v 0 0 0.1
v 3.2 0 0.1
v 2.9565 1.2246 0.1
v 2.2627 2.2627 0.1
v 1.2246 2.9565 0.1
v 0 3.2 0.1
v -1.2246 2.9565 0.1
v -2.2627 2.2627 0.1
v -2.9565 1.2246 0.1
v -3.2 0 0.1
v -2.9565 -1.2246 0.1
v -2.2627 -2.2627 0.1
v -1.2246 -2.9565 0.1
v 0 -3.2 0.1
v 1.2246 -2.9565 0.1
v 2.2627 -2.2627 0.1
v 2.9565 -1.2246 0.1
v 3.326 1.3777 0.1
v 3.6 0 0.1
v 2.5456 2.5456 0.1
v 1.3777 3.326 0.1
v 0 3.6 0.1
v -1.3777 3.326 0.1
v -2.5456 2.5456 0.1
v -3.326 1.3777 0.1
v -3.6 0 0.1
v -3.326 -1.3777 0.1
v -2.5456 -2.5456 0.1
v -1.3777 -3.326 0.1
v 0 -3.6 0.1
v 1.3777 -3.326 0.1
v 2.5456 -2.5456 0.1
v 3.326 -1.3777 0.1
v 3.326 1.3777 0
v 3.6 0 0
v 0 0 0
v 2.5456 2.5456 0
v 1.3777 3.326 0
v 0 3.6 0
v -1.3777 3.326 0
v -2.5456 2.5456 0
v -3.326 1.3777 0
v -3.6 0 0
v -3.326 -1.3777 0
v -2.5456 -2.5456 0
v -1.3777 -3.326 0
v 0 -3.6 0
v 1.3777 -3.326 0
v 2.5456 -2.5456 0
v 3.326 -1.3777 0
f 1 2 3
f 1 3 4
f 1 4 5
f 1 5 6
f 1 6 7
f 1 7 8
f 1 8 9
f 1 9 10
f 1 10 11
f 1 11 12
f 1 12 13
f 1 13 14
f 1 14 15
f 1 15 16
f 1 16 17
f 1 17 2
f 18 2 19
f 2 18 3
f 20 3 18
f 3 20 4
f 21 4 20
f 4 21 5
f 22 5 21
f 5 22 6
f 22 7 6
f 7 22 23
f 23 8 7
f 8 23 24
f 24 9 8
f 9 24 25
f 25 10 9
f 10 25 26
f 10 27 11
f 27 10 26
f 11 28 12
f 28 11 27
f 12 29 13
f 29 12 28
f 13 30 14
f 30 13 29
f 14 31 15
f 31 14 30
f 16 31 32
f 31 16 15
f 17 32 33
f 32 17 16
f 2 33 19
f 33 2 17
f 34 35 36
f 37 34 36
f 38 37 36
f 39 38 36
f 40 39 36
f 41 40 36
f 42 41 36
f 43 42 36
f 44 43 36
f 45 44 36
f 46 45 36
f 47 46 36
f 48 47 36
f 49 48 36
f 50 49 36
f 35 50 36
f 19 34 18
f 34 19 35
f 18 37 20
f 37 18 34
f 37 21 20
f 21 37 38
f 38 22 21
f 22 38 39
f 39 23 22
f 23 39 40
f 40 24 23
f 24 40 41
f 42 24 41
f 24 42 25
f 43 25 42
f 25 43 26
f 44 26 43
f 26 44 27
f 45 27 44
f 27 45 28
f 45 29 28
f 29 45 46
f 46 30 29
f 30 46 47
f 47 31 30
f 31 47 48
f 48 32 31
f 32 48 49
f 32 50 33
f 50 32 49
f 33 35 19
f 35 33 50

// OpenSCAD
// file: ../p/4-4cyli.scad
use <../lib.scad>
function ldraw_lib__4_4cyli() = [
// 0 Cylinder 1.0
// 0 Name: 4-4cyli.dat
// 0 Author: James Jessiman
// 0 !LDRAW_ORG Primitive UPDATE 2005-01
// 0 !LICENSE Licensed under CC BY 2.0 and CC BY 4.0 : see CAreadme.txt
// 
// 0 BFC CERTIFY CCW
  [0,"BFC","CERTIFY"],
  [0,"BFC","CCW"],
// 
// 0 !HISTORY 1998-12-15 [PTadmin] Official Update 1998-10
// 0 !HISTORY 2002-03-23 [sbliss] Added BFC statement; merged headers from files in distributions LDraw 0.27 and Complete.
// 0 !HISTORY 2002-04-25 [PTadmin] Official Update 2002-02
// 0 !HISTORY 2004-12-14 [guyvivan] BFC CCW
// 0 !HISTORY 2005-12-28 [PTadmin] Official Update 2005-01
// 0 !HISTORY 2007-06-24 [PTadmin] Header formatted for Contributor Agreement
// 0 !HISTORY 2008-07-01 [PTadmin] Official Update 2008-01
// 
// 
// 4 16 1 1 0 0.9239 1 0.3827 0.9239 0 0.3827 1 0 0
  [4,16,1,1,0,0.9239,1,0.3827,0.9239,0,0.3827,1,0,0],
// 5 24 1 0 0 1 1 0 0.9239 0 0.3827 0.9239 0 -0.3827
  [5,24,1,0,0,1,1,0,0.9239,0,0.3827,0.9239,0,-0.3827],
// 4 16 0.9239 1 0.3827 0.7071 1 0.7071 0.7071 0 0.7071 0.9239 0 0.3827
  [4,16,0.9239,1,0.3827,0.7071,1,0.7071,0.7071,0,0.7071,0.9239,0,0.3827],
// 5 24 0.9239 0 0.3827 0.9239 1 0.3827 0.7071 0 0.7071 1 0 0
  [5,24,0.9239,0,0.3827,0.9239,1,0.3827,0.7071,0,0.7071,1,0,0],
// 4 16 0.7071 1 0.7071 0.3827 1 0.9239 0.3827 0 0.9239 0.7071 0 0.7071
  [4,16,0.7071,1,0.7071,0.3827,1,0.9239,0.3827,0,0.9239,0.7071,0,0.7071],
// 5 24 0.7071 0 0.7071 0.7071 1 0.7071 0.3827 0 0.9239 0.9239 0 0.3827
  [5,24,0.7071,0,0.7071,0.7071,1,0.7071,0.3827,0,0.9239,0.9239,0,0.3827],
// 4 16 0.3827 1 0.9239 0 1 1 0 0 1 0.3827 0 0.9239
  [4,16,0.3827,1,0.9239,0,1,1,0,0,1,0.3827,0,0.9239],
// 5 24 0.3827 0 0.9239 0.3827 1 0.9239 0 0 1 0.7071 0 0.7071
  [5,24,0.3827,0,0.9239,0.3827,1,0.9239,0,0,1,0.7071,0,0.7071],
// 4 16 0 1 1 -0.3827 1 0.9239 -0.3827 0 0.9239 0 0 1
  [4,16,0,1,1,-0.3827,1,0.9239,-0.3827,0,0.9239,0,0,1],
// 5 24 0 0 1 0 1 1 -0.3827 0 0.9239 0.3827 0 0.9239
  [5,24,0,0,1,0,1,1,-0.3827,0,0.9239,0.3827,0,0.9239],
// 4 16 -0.3827 1 0.9239 -0.7071 1 0.7071 -0.7071 0 0.7071 -0.3827 0 0.9239
  [4,16,-0.3827,1,0.9239,-0.7071,1,0.7071,-0.7071,0,0.7071,-0.3827,0,0.9239],
// 5 24 -0.3827 0 0.9239 -0.3827 1 0.9239 -0.7071 0 0.7071 0 0 1
  [5,24,-0.3827,0,0.9239,-0.3827,1,0.9239,-0.7071,0,0.7071,0,0,1],
// 4 16 -0.7071 1 0.7071 -0.9239 1 0.3827 -0.9239 0 0.3827 -0.7071 0 0.7071
  [4,16,-0.7071,1,0.7071,-0.9239,1,0.3827,-0.9239,0,0.3827,-0.7071,0,0.7071],
// 5 24 -0.7071 0 0.7071 -0.7071 1 0.7071 -0.9239 0 0.3827 -0.3827 0 0.9239
  [5,24,-0.7071,0,0.7071,-0.7071,1,0.7071,-0.9239,0,0.3827,-0.3827,0,0.9239],
// 4 16 -0.9239 1 0.3827 -1 1 0 -1 0 0 -0.9239 0 0.3827
  [4,16,-0.9239,1,0.3827,-1,1,0,-1,0,0,-0.9239,0,0.3827],
// 5 24 -0.9239 0 0.3827 -0.9239 1 0.3827 -1 0 0 -0.7071 0 0.7071
  [5,24,-0.9239,0,0.3827,-0.9239,1,0.3827,-1,0,0,-0.7071,0,0.7071],
// 4 16 -1 1 0 -0.9239 1 -0.3827 -0.9239 0 -0.3827 -1 0 0
  [4,16,-1,1,0,-0.9239,1,-0.3827,-0.9239,0,-0.3827,-1,0,0],
// 5 24 -1 0 0 -1 1 0 -0.9239 0 -0.3827 -0.9239 0 0.3827
  [5,24,-1,0,0,-1,1,0,-0.9239,0,-0.3827,-0.9239,0,0.3827],
// 4 16 -0.9239 1 -0.3827 -0.7071 1 -0.7071 -0.7071 0 -0.7071 -0.9239 0 -0.3827
  [4,16,-0.9239,1,-0.3827,-0.7071,1,-0.7071,-0.7071,0,-0.7071,-0.9239,0,-0.3827],
// 5 24 -0.9239 0 -0.3827 -0.9239 1 -0.3827 -0.7071 0 -0.7071 -1 0 0
  [5,24,-0.9239,0,-0.3827,-0.9239,1,-0.3827,-0.7071,0,-0.7071,-1,0,0],
// 4 16 -0.7071 1 -0.7071 -0.3827 1 -0.9239 -0.3827 0 -0.9239 -0.7071 0 -0.7071
  [4,16,-0.7071,1,-0.7071,-0.3827,1,-0.9239,-0.3827,0,-0.9239,-0.7071,0,-0.7071],
// 5 24 -0.7071 0 -0.7071 -0.7071 1 -0.7071 -0.3827 0 -0.9239 -0.9239 0 -0.3827
  [5,24,-0.7071,0,-0.7071,-0.7071,1,-0.7071,-0.3827,0,-0.9239,-0.9239,0,-0.3827],
// 4 16 -0.3827 1 -0.9239 0 1 -1 0 0 -1 -0.3827 0 -0.9239
  [4,16,-0.3827,1,-0.9239,0,1,-1,0,0,-1,-0.3827,0,-0.9239],
// 5 24 -0.3827 0 -0.9239 -0.3827 1 -0.9239 0 0 -1 -0.7071 0 -0.7071
  [5,24,-0.3827,0,-0.9239,-0.3827,1,-0.9239,0,0,-1,-0.7071,0,-0.7071],
// 4 16 0 1 -1 0.3827 1 -0.9239 0.3827 0 -0.9239 0 0 -1
  [4,16,0,1,-1,0.3827,1,-0.9239,0.3827,0,-0.9239,0,0,-1],
// 5 24 0 0 -1 0 1 -1 0.3827 0 -0.9239 -0.3827 0 -0.9239
  [5,24,0,0,-1,0,1,-1,0.3827,0,-0.9239,-0.3827,0,-0.9239],
// 4 16 0.3827 1 -0.9239 0.7071 1 -0.7071 0.7071 0 -0.7071 0.3827 0 -0.9239
  [4,16,0.3827,1,-0.9239,0.7071,1,-0.7071,0.7071,0,-0.7071,0.3827,0,-0.9239],
// 5 24 0.3827 0 -0.9239 0.3827 1 -0.9239 0.7071 0 -0.7071 0 0 -1
  [5,24,0.3827,0,-0.9239,0.3827,1,-0.9239,0.7071,0,-0.7071,0,0,-1],
// 4 16 0.7071 1 -0.7071 0.9239 1 -0.3827 0.9239 0 -0.3827 0.7071 0 -0.7071
  [4,16,0.7071,1,-0.7071,0.9239,1,-0.3827,0.9239,0,-0.3827,0.7071,0,-0.7071],
// 5 24 0.7071 0 -0.7071 0.7071 1 -0.7071 0.9239 0 -0.3827 0.3827 0 -0.9239
  [5,24,0.7071,0,-0.7071,0.7071,1,-0.7071,0.9239,0,-0.3827,0.3827,0,-0.9239],
// 4 16 0.9239 1 -0.3827 1 1 0 1 0 0 0.9239 0 -0.3827
  [4,16,0.9239,1,-0.3827,1,1,0,1,0,0,0.9239,0,-0.3827],
// 5 24 0.9239 0 -0.3827 0.9239 1 -0.3827 1 0 0 0.7071 0 -0.7071
  [5,24,0.9239,0,-0.3827,0.9239,1,-0.3827,1,0,0,0.7071,0,-0.7071],
// 0
];
module ldraw_lib__4_4cyli(step=0, col=false, unit=2/5, alt=false, line=0.2, solid=!$preview)
    makepoly(ldraw_lib__4_4cyli(), step=step, col=col, unit=unit, alt=alt, line=line, solid=solid);
ldraw_lib__4_4cyli(line=0.2);
// file: ../p/4-4ring8.scad
use <../lib.scad>
function ldraw_lib__4_4ring8() = [
// 0 Ring  8 x 1.0
// 0 Name: 4-4ring8.dat
// 0 Author: Steffen [Steffen]
// 0 !LDRAW_ORG Primitive UPDATE 2012-01
// 0 !LICENSE Licensed under CC BY 4.0 : see CAreadme.txt
// 
// 0 BFC CERTIFY CCW
  [0,"BFC","CERTIFY"],
  [0,"BFC","CCW"],
// 
// 0 !HISTORY 2003-12-19 [PTadmin] Official Update 2003-03
// 0 !HISTORY 2007-06-24 [PTadmin] Header formatted for Contributor Agreement
// 0 !HISTORY 2008-07-01 [PTadmin] Official Update 2008-01
// 0 !HISTORY 2012-02-16 [Philo] Changed to CCW
// 0 !HISTORY 2012-03-30 [PTadmin] Official Update 2012-01
// 
// 
// 4 16 9 0 0 8.3151 0 3.4443 7.3912 0 3.0616 8 0 0
  [4,16,9,0,0,8.3151,0,3.4443,7.3912,0,3.0616,8,0,0],
// 4 16 8.3151 0 3.4443 6.3639 0 6.3639 5.6568 0 5.6568 7.3912 0 3.0616
  [4,16,8.3151,0,3.4443,6.3639,0,6.3639,5.6568,0,5.6568,7.3912,0,3.0616],
// 4 16 6.3639 0 6.3639 3.4443 0 8.3151 3.0616 0 7.3912 5.6568 0 5.6568
  [4,16,6.3639,0,6.3639,3.4443,0,8.3151,3.0616,0,7.3912,5.6568,0,5.6568],
// 4 16 3.4443 0 8.3151 0 0 9 0 0 8 3.0616 0 7.3912
  [4,16,3.4443,0,8.3151,0,0,9,0,0,8,3.0616,0,7.3912],
// 4 16 0 0 9 -3.4443 0 8.3151 -3.0616 0 7.3912 0 0 8
  [4,16,0,0,9,-3.4443,0,8.3151,-3.0616,0,7.3912,0,0,8],
// 4 16 -3.4443 0 8.3151 -6.3639 0 6.3639 -5.6568 0 5.6568 -3.0616 0 7.3912
  [4,16,-3.4443,0,8.3151,-6.3639,0,6.3639,-5.6568,0,5.6568,-3.0616,0,7.3912],
// 4 16 -6.3639 0 6.3639 -8.3151 0 3.4443 -7.3912 0 3.0616 -5.6568 0 5.6568
  [4,16,-6.3639,0,6.3639,-8.3151,0,3.4443,-7.3912,0,3.0616,-5.6568,0,5.6568],
// 4 16 -8.3151 0 3.4443 -9 0 0 -8 0 0 -7.3912 0 3.0616
  [4,16,-8.3151,0,3.4443,-9,0,0,-8,0,0,-7.3912,0,3.0616],
// 4 16 -9 0 0 -8.3151 0 -3.4443 -7.3912 0 -3.0616 -8 0 0
  [4,16,-9,0,0,-8.3151,0,-3.4443,-7.3912,0,-3.0616,-8,0,0],
// 4 16 -8.3151 0 -3.4443 -6.3639 0 -6.3639 -5.6568 0 -5.6568 -7.3912 0 -3.0616
  [4,16,-8.3151,0,-3.4443,-6.3639,0,-6.3639,-5.6568,0,-5.6568,-7.3912,0,-3.0616],
// 4 16 -6.3639 0 -6.3639 -3.4443 0 -8.3151 -3.0616 0 -7.3912 -5.6568 0 -5.6568
  [4,16,-6.3639,0,-6.3639,-3.4443,0,-8.3151,-3.0616,0,-7.3912,-5.6568,0,-5.6568],
// 4 16 -3.4443 0 -8.3151 0 0 -9 0 0 -8 -3.0616 0 -7.3912
  [4,16,-3.4443,0,-8.3151,0,0,-9,0,0,-8,-3.0616,0,-7.3912],
// 4 16 0 0 -9 3.4443 0 -8.3151 3.0616 0 -7.3912 0 0 -8
  [4,16,0,0,-9,3.4443,0,-8.3151,3.0616,0,-7.3912,0,0,-8],
// 4 16 3.4443 0 -8.3151 6.3639 0 -6.3639 5.6568 0 -5.6568 3.0616 0 -7.3912
  [4,16,3.4443,0,-8.3151,6.3639,0,-6.3639,5.6568,0,-5.6568,3.0616,0,-7.3912],
// 4 16 6.3639 0 -6.3639 8.3151 0 -3.4443 7.3912 0 -3.0616 5.6568 0 -5.6568
  [4,16,6.3639,0,-6.3639,8.3151,0,-3.4443,7.3912,0,-3.0616,5.6568,0,-5.6568],
// 4 16 8.3151 0 -3.4443 9 0 0 8 0 0 7.3912 0 -3.0616
  [4,16,8.3151,0,-3.4443,9,0,0,8,0,0,7.3912,0,-3.0616],
];
module ldraw_lib__4_4ring8(step=0, col=false, unit=2/5, alt=false, line=0.2, solid=!$preview)
    makepoly(ldraw_lib__4_4ring8(), step=step, col=col, unit=unit, alt=alt, line=line, solid=solid);
ldraw_lib__4_4ring8(line=0.2);
// file: ../p/4-4disc.scad
use <../lib.scad>
function ldraw_lib__4_4disc() = [
// 0 Disc 1.0
// 0 Name: 4-4disc.dat
// 0 Author: James Jessiman
// 0 !LDRAW_ORG Primitive UPDATE 2002-02
// 0 !LICENSE Licensed under CC BY 4.0 : see CAreadme.txt
// 
// 0 BFC CERTIFY CCW
  [0,"BFC","CERTIFY"],
  [0,"BFC","CCW"],
// 
// 0 !HISTORY 1998-12-15 [PTadmin] Official Update 1998-10
// 0 !HISTORY 2002-03-23 [sbliss] Added BFC statement
// 0 !HISTORY 2002-04-25 [PTadmin] Official Update 2002-02
// 0 !HISTORY 2007-06-24 [PTadmin] Header formatted for Contributor Agreement
// 0 !HISTORY 2008-07-01 [PTadmin] Official Update 2008-01
// 
// 
// 3 16 0 0 0 1 0 0 0.9239 0 0.3827
  [3,16,0,0,0,1,0,0,0.9239,0,0.3827],
// 3 16 0 0 0 0.9239 0 0.3827 0.7071 0 0.7071
  [3,16,0,0,0,0.9239,0,0.3827,0.7071,0,0.7071],
// 3 16 0 0 0 0.7071 0 0.7071 0.3827 0 0.9239
  [3,16,0,0,0,0.7071,0,0.7071,0.3827,0,0.9239],
// 3 16 0 0 0 0.3827 0 0.9239 0 0 1
  [3,16,0,0,0,0.3827,0,0.9239,0,0,1],
// 3 16 0 0 0 0 0 1 -0.3827 0 0.9239
  [3,16,0,0,0,0,0,1,-0.3827,0,0.9239],
// 3 16 0 0 0 -0.3827 0 0.9239 -0.7071 0 0.7071
  [3,16,0,0,0,-0.3827,0,0.9239,-0.7071,0,0.7071],
// 3 16 0 0 0 -0.7071 0 0.7071 -0.9239 0 0.3827
  [3,16,0,0,0,-0.7071,0,0.7071,-0.9239,0,0.3827],
// 3 16 0 0 0 -0.9239 0 0.3827 -1 0 -0
  [3,16,0,0,0,-0.9239,0,0.3827,-1,0,-0],
// 3 16 0 0 0 -1 0 -0 -0.9239 0 -0.3827
  [3,16,0,0,0,-1,0,-0,-0.9239,0,-0.3827],
// 3 16 0 0 0 -0.9239 0 -0.3827 -0.7071 0 -0.7071
  [3,16,0,0,0,-0.9239,0,-0.3827,-0.7071,0,-0.7071],
// 3 16 0 0 0 -0.7071 0 -0.7071 -0.3827 0 -0.9239
  [3,16,0,0,0,-0.7071,0,-0.7071,-0.3827,0,-0.9239],
// 3 16 0 0 0 -0.3827 0 -0.9239 0 0 -1
  [3,16,0,0,0,-0.3827,0,-0.9239,0,0,-1],
// 3 16 0 0 0 0 0 -1 0.3827 0 -0.9239
  [3,16,0,0,0,0,0,-1,0.3827,0,-0.9239],
// 3 16 0 0 0 0.3827 0 -0.9239 0.7071 0 -0.7071
  [3,16,0,0,0,0.3827,0,-0.9239,0.7071,0,-0.7071],
// 3 16 0 0 0 0.7071 0 -0.7071 0.9239 0 -0.3827
  [3,16,0,0,0,0.7071,0,-0.7071,0.9239,0,-0.3827],
// 3 16 0 0 0 0.9239 0 -0.3827 1 0 0
  [3,16,0,0,0,0.9239,0,-0.3827,1,0,0],
// 0
];
module ldraw_lib__4_4disc(step=0, col=false, unit=2/5, alt=false, line=0.2, solid=!$preview)
    makepoly(ldraw_lib__4_4disc(), step=step, col=col, unit=unit, alt=alt, line=line, solid=solid);
ldraw_lib__4_4disc(line=0.2);
// file: ../p/4-4cylc3.scad
use <../lib.scad>
use <4-4cyli.scad>
use <4-4disc.scad>
function ldraw_lib__4_4cylc3() = [
// 0 Cylinder Closed 1.0 without Top or Bottom Edge Lines
// 0 Name: 4-4cylc3.dat
// 0 Author: Chris Dee [cwdee]
// 0 !LDRAW_ORG Primitive UPDATE 2017-01
// 0 !LICENSE Licensed under CC BY 4.0 : see CAreadme.txt
// 
// 0 BFC CERTIFY CCW
  [0,"BFC","CERTIFY"],
  [0,"BFC","CCW"],
// 
// 0 !HISTORY 2017-12-30 [PTadmin] Official Update 2017-01
// 
// 
// 1 16 0 0 0 1 0 0 0 1 0 0 0 1 4-4disc.dat
  [1,16,0,0,0,1,0,0,0,1,0,0,0,1, ldraw_lib__4_4disc()],
// 1 16 0 0 0 1 0 0 0 1 0 0 0 1 4-4cyli.dat
  [1,16,0,0,0,1,0,0,0,1,0,0,0,1, ldraw_lib__4_4cyli()],
// 0
];
module ldraw_lib__4_4cylc3(step=0, col=false, unit=2/5, alt=false, line=0.2, solid=!$preview)
    makepoly(ldraw_lib__4_4cylc3(), step=step, col=col, unit=unit, alt=alt, line=line, solid=solid);
ldraw_lib__4_4cylc3(line=0.2);
// main file
use <../lib.scad>
use <../p/4-4cylc3.scad>
use <../p/4-4disc.scad>
use <../p/4-4ring8.scad>
function ldraw_lib__003673b() = [
// 0 Sticker  0.9 x  0.9 Round with White Disc and Black Circle
// 0 Name: 003673b.dat
// 0 Author: Willy Tschager [Holly-Wood]
// 0 !LDRAW_ORG Part UPDATE 2020-03
// 0 !LICENSE Licensed under CC BY 4.0 : see CAreadme.txt
// 
// 0 BFC CERTIFY CCW
  [0,"BFC","CERTIFY"],
  [0,"BFC","CCW"],
// 
// 0 !KEYWORDS animal, documentary, headlight, hunt, legoland, off-road, set 699
// 0 !KEYWORDS wildlife
// 
// 0 !HISTORY 2020-12-29 [PTadmin] Official Update 2020-03
// 
// 
// 0 // Pattern
// 1 15 0 -.25 0 8 0 0 0 1 0 0 0 8 4-4disc.dat
  [1,15,0,-.25,0,8,0,0,0,1,0,0,0,8, ldraw_lib__4_4disc()],
// 1 0 0 -.25 0 1 0 0 0 1 0 0 0 1 4-4ring8.dat
  [1,0,0,-.25,0,1,0,0,0,1,0,0,0,1, ldraw_lib__4_4ring8()],
// 
// 0 // Small Cylinder
// 1 16 0 0 0 9 0 0 0 -.25 0 0 0 9 4-4cylc3.dat
  [1,16,0,0,0,9,0,0,0,-.25,0,0,0,9, ldraw_lib__4_4cylc3()],
];
module ldraw_lib__003673b(step=0, col=false, unit=2/5, alt=false, line=0.2, solid=!$preview)
    makepoly(ldraw_lib__003673b(), step=step, col=col, unit=unit, alt=alt, line=line, solid=solid);
ldraw_lib__003673b(line=0.2);
